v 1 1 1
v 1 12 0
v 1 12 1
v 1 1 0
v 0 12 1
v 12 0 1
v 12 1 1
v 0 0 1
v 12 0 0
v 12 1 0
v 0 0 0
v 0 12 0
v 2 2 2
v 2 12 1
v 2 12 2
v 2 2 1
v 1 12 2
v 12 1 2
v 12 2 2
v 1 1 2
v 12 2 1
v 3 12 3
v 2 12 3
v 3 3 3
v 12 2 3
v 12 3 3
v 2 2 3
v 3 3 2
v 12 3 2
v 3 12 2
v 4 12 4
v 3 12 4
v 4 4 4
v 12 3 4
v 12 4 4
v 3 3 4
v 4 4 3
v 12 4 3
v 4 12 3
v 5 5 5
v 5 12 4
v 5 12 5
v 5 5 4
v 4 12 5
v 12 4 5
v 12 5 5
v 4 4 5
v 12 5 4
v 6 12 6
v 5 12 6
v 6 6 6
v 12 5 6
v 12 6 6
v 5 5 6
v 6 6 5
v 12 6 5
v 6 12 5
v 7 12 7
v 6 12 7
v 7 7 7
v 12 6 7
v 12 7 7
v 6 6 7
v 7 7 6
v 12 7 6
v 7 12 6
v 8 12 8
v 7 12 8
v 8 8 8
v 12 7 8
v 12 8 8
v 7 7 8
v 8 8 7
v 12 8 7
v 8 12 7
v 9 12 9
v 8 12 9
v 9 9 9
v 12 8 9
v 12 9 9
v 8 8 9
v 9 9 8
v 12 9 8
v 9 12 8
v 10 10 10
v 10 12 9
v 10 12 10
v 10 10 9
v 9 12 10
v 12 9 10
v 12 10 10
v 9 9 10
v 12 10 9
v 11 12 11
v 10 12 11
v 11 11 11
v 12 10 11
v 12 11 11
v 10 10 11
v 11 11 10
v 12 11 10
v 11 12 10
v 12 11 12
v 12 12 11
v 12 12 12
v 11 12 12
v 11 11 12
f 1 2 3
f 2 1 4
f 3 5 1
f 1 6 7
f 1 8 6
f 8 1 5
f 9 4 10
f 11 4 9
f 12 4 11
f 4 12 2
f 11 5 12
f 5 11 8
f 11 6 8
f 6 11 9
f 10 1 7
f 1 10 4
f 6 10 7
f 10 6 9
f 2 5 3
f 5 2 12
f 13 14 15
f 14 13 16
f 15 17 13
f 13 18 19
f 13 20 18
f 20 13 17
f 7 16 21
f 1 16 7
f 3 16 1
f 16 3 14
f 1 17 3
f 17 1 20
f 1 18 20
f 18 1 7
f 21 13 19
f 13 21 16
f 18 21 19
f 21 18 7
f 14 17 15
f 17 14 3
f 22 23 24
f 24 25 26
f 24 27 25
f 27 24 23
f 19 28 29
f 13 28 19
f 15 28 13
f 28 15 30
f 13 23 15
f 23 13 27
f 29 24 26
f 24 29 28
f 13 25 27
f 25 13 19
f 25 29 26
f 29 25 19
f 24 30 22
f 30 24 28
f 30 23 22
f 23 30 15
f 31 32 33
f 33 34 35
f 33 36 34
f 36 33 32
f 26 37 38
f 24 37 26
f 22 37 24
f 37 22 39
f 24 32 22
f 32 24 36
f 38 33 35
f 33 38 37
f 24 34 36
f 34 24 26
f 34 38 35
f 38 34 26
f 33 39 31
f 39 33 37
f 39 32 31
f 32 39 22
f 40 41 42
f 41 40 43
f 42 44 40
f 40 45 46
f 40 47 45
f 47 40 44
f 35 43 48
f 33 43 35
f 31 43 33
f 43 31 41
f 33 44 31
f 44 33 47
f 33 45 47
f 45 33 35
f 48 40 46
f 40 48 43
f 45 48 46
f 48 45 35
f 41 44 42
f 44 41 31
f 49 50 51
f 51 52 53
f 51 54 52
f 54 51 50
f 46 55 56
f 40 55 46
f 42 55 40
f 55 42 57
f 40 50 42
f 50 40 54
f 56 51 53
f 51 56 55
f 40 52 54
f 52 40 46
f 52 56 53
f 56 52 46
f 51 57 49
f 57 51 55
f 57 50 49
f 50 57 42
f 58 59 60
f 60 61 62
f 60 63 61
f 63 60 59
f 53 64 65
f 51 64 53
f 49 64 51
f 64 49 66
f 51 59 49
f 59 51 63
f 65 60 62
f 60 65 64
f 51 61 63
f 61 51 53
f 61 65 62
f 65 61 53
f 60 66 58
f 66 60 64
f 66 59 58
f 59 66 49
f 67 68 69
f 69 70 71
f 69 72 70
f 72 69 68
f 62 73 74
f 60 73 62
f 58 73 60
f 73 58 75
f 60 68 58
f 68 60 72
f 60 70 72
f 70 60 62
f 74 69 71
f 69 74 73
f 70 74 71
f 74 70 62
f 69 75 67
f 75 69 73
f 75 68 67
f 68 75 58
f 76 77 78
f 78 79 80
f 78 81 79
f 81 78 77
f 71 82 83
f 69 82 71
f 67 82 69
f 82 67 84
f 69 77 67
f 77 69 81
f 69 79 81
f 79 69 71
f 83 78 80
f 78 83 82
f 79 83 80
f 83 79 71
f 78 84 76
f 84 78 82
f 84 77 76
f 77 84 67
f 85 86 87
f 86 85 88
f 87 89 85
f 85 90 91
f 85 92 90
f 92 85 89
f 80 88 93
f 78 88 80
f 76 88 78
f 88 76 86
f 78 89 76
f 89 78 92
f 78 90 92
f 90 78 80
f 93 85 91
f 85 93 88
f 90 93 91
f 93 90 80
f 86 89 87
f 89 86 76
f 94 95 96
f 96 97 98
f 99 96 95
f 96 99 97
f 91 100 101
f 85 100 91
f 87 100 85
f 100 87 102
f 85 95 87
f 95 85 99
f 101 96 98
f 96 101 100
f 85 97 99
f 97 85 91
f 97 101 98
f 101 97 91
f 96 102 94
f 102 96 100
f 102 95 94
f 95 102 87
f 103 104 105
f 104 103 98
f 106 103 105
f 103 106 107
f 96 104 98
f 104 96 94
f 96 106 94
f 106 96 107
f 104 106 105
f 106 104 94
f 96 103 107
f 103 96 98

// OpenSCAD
union() {
    translate([0, 0, 0]) cube([1, 1, 1]);
    translate([1, 0, 0]) cube([1, 1, 1]);
    translate([2, 0, 0]) cube([1, 1, 1]);
    translate([3, 0, 0]) cube([1, 1, 1]);
    translate([4, 0, 0]) cube([1, 1, 1]);
    translate([5, 0, 0]) cube([1, 1, 1]);
    translate([6, 0, 0]) cube([1, 1, 1]);
    translate([7, 0, 0]) cube([1, 1, 1]);
    translate([8, 0, 0]) cube([1, 1, 1]);
    translate([9, 0, 0]) cube([1, 1, 1]);
    translate([10, 0, 0]) cube([1, 1, 1]);
    translate([11, 0, 0]) cube([1, 1, 1]);
    translate([0, 1, 0]) cube([1, 1, 1]);
    translate([0, 2, 0]) cube([1, 1, 1]);
    translate([0, 3, 0]) cube([1, 1, 1]);
    translate([0, 4, 0]) cube([1, 1, 1]);
    translate([0, 5, 0]) cube([1, 1, 1]);
    translate([0, 6, 0]) cube([1, 1, 1]);
    translate([0, 7, 0]) cube([1, 1, 1]);
    translate([0, 8, 0]) cube([1, 1, 1]);
    translate([0, 9, 0]) cube([1, 1, 1]);
    translate([0, 10, 0]) cube([1, 1, 1]);
    translate([0, 11, 0]) cube([1, 1, 1]);
    translate([1, 1, 1]) cube([1, 1, 1]);
    translate([2, 1, 1]) cube([1, 1, 1]);
    translate([3, 1, 1]) cube([1, 1, 1]);
    translate([4, 1, 1]) cube([1, 1, 1]);
    translate([5, 1, 1]) cube([1, 1, 1]);
    translate([6, 1, 1]) cube([1, 1, 1]);
    translate([7, 1, 1]) cube([1, 1, 1]);
    translate([8, 1, 1]) cube([1, 1, 1]);
    translate([9, 1, 1]) cube([1, 1, 1]);
    translate([10, 1, 1]) cube([1, 1, 1]);
    translate([11, 1, 1]) cube([1, 1, 1]);
    translate([1, 2, 1]) cube([1, 1, 1]);
    translate([1, 3, 1]) cube([1, 1, 1]);
    translate([1, 4, 1]) cube([1, 1, 1]);
    translate([1, 5, 1]) cube([1, 1, 1]);
    translate([1, 6, 1]) cube([1, 1, 1]);
    translate([1, 7, 1]) cube([1, 1, 1]);
    translate([1, 8, 1]) cube([1, 1, 1]);
    translate([1, 9, 1]) cube([1, 1, 1]);
    translate([1, 10, 1]) cube([1, 1, 1]);
    translate([1, 11, 1]) cube([1, 1, 1]);
    translate([2, 2, 2]) cube([1, 1, 1]);
    translate([3, 2, 2]) cube([1, 1, 1]);
    translate([4, 2, 2]) cube([1, 1, 1]);
    translate([5, 2, 2]) cube([1, 1, 1]);
    translate([6, 2, 2]) cube([1, 1, 1]);
    translate([7, 2, 2]) cube([1, 1, 1]);
    translate([8, 2, 2]) cube([1, 1, 1]);
    translate([9, 2, 2]) cube([1, 1, 1]);
    translate([10, 2, 2]) cube([1, 1, 1]);
    translate([11, 2, 2]) cube([1, 1, 1]);
    translate([2, 3, 2]) cube([1, 1, 1]);
    translate([2, 4, 2]) cube([1, 1, 1]);
    translate([2, 5, 2]) cube([1, 1, 1]);
    translate([2, 6, 2]) cube([1, 1, 1]);
    translate([2, 7, 2]) cube([1, 1, 1]);
    translate([2, 8, 2]) cube([1, 1, 1]);
    translate([2, 9, 2]) cube([1, 1, 1]);
    translate([2, 10, 2]) cube([1, 1, 1]);
    translate([2, 11, 2]) cube([1, 1, 1]);
    translate([3, 3, 3]) cube([1, 1, 1]);
    translate([4, 3, 3]) cube([1, 1, 1]);
    translate([5, 3, 3]) cube([1, 1, 1]);
    translate([6, 3, 3]) cube([1, 1, 1]);
    translate([7, 3, 3]) cube([1, 1, 1]);
    translate([8, 3, 3]) cube([1, 1, 1]);
    translate([9, 3, 3]) cube([1, 1, 1]);
    translate([10, 3, 3]) cube([1, 1, 1]);
    translate([11, 3, 3]) cube([1, 1, 1]);
    translate([3, 4, 3]) cube([1, 1, 1]);
    translate([3, 5, 3]) cube([1, 1, 1]);
    translate([3, 6, 3]) cube([1, 1, 1]);
    translate([3, 7, 3]) cube([1, 1, 1]);
    translate([3, 8, 3]) cube([1, 1, 1]);
    translate([3, 9, 3]) cube([1, 1, 1]);
    translate([3, 10, 3]) cube([1, 1, 1]);
    translate([3, 11, 3]) cube([1, 1, 1]);
    translate([4, 4, 4]) cube([1, 1, 1]);
    translate([5, 4, 4]) cube([1, 1, 1]);
    translate([6, 4, 4]) cube([1, 1, 1]);
    translate([7, 4, 4]) cube([1, 1, 1]);
    translate([8, 4, 4]) cube([1, 1, 1]);
    translate([9, 4, 4]) cube([1, 1, 1]);
    translate([10, 4, 4]) cube([1, 1, 1]);
    translate([11, 4, 4]) cube([1, 1, 1]);
    translate([4, 5, 4]) cube([1, 1, 1]);
    translate([4, 6, 4]) cube([1, 1, 1]);
    translate([4, 7, 4]) cube([1, 1, 1]);
    translate([4, 8, 4]) cube([1, 1, 1]);
    translate([4, 9, 4]) cube([1, 1, 1]);
    translate([4, 10, 4]) cube([1, 1, 1]);
    translate([4, 11, 4]) cube([1, 1, 1]);
    translate([5, 5, 5]) cube([1, 1, 1]);
    translate([6, 5, 5]) cube([1, 1, 1]);
    translate([7, 5, 5]) cube([1, 1, 1]);
    translate([8, 5, 5]) cube([1, 1, 1]);
    translate([9, 5, 5]) cube([1, 1, 1]);
    translate([10, 5, 5]) cube([1, 1, 1]);
    translate([11, 5, 5]) cube([1, 1, 1]);
    translate([5, 6, 5]) cube([1, 1, 1]);
    translate([5, 7, 5]) cube([1, 1, 1]);
    translate([5, 8, 5]) cube([1, 1, 1]);
    translate([5, 9, 5]) cube([1, 1, 1]);
    translate([5, 10, 5]) cube([1, 1, 1]);
    translate([5, 11, 5]) cube([1, 1, 1]);
    translate([6, 6, 6]) cube([1, 1, 1]);
    translate([7, 6, 6]) cube([1, 1, 1]);
    translate([8, 6, 6]) cube([1, 1, 1]);
    translate([9, 6, 6]) cube([1, 1, 1]);
    translate([10, 6, 6]) cube([1, 1, 1]);
    translate([11, 6, 6]) cube([1, 1, 1]);
    translate([6, 7, 6]) cube([1, 1, 1]);
    translate([6, 8, 6]) cube([1, 1, 1]);
    translate([6, 9, 6]) cube([1, 1, 1]);
    translate([6, 10, 6]) cube([1, 1, 1]);
    translate([6, 11, 6]) cube([1, 1, 1]);
    translate([7, 7, 7]) cube([1, 1, 1]);
    translate([8, 7, 7]) cube([1, 1, 1]);
    translate([9, 7, 7]) cube([1, 1, 1]);
    translate([10, 7, 7]) cube([1, 1, 1]);
    translate([11, 7, 7]) cube([1, 1, 1]);
    translate([7, 8, 7]) cube([1, 1, 1]);
    translate([7, 9, 7]) cube([1, 1, 1]);
    translate([7, 10, 7]) cube([1, 1, 1]);
    translate([7, 11, 7]) cube([1, 1, 1]);
    translate([8, 8, 8]) cube([1, 1, 1]);
    translate([9, 8, 8]) cube([1, 1, 1]);
    translate([10, 8, 8]) cube([1, 1, 1]);
    translate([11, 8, 8]) cube([1, 1, 1]);
    translate([8, 9, 8]) cube([1, 1, 1]);
    translate([8, 10, 8]) cube([1, 1, 1]);
    translate([8, 11, 8]) cube([1, 1, 1]);
    translate([9, 9, 9]) cube([1, 1, 1]);
    translate([10, 9, 9]) cube([1, 1, 1]);
    translate([11, 9, 9]) cube([1, 1, 1]);
    translate([9, 10, 9]) cube([1, 1, 1]);
    translate([9, 11, 9]) cube([1, 1, 1]);
    translate([10, 10, 10]) cube([1, 1, 1]);
    translate([11, 10, 10]) cube([1, 1, 1]);
    translate([10, 11, 10]) cube([1, 1, 1]);
    translate([11, 11, 11]) cube([1, 1, 1]);
}
